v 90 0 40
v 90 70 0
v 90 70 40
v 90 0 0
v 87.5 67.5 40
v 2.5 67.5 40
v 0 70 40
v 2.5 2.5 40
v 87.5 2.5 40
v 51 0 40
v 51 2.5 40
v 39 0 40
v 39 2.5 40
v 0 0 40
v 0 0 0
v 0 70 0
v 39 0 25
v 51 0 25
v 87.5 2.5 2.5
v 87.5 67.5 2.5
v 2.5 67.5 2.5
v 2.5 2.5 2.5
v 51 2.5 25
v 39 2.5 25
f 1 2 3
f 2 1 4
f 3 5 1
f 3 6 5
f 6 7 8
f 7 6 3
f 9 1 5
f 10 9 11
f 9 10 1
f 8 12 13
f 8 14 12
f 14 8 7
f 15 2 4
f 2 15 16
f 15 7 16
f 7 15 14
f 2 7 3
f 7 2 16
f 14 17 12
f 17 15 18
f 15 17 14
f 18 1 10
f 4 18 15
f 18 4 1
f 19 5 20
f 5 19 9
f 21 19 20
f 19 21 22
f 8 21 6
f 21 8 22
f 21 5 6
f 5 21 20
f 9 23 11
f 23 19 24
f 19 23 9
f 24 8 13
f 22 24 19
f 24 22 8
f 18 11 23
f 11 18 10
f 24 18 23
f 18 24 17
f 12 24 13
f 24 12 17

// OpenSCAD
$fn = 32;

// ----------------------------------------------------------------------
// Enclosure box: notch enclosure
// ----------------------------------------------------------------------

// --- parameters (mm) ---
box_l = 90;               // outer length, X
box_w = 70;               // outer width, Y
box_h = 40;               // outer height
wall_t = 2.5;             // wall thickness
notch_w = 12;             // cable notch width
notch_h = 15;             // cable notch height
fit_tol = 0.05;           // tolerance for press fits, mm
free_tol = 0.2;           // tolerance for clearance fits, mm

inner_h = box_h - wall_t;  // cavity depth
boss_h = inner_h - 2;  // corner boss height

difference() {
  cube([box_l, box_w, box_h]);
  translate([wall_t, wall_t, wall_t])
    cube([box_l - 2 * wall_t, box_w - 2 * wall_t, box_h]);
  translate([box_l / 2 - notch_w / 2, -1, box_h - notch_h])
    cube([notch_w, wall_t + 2, notch_h + 1]);
}
